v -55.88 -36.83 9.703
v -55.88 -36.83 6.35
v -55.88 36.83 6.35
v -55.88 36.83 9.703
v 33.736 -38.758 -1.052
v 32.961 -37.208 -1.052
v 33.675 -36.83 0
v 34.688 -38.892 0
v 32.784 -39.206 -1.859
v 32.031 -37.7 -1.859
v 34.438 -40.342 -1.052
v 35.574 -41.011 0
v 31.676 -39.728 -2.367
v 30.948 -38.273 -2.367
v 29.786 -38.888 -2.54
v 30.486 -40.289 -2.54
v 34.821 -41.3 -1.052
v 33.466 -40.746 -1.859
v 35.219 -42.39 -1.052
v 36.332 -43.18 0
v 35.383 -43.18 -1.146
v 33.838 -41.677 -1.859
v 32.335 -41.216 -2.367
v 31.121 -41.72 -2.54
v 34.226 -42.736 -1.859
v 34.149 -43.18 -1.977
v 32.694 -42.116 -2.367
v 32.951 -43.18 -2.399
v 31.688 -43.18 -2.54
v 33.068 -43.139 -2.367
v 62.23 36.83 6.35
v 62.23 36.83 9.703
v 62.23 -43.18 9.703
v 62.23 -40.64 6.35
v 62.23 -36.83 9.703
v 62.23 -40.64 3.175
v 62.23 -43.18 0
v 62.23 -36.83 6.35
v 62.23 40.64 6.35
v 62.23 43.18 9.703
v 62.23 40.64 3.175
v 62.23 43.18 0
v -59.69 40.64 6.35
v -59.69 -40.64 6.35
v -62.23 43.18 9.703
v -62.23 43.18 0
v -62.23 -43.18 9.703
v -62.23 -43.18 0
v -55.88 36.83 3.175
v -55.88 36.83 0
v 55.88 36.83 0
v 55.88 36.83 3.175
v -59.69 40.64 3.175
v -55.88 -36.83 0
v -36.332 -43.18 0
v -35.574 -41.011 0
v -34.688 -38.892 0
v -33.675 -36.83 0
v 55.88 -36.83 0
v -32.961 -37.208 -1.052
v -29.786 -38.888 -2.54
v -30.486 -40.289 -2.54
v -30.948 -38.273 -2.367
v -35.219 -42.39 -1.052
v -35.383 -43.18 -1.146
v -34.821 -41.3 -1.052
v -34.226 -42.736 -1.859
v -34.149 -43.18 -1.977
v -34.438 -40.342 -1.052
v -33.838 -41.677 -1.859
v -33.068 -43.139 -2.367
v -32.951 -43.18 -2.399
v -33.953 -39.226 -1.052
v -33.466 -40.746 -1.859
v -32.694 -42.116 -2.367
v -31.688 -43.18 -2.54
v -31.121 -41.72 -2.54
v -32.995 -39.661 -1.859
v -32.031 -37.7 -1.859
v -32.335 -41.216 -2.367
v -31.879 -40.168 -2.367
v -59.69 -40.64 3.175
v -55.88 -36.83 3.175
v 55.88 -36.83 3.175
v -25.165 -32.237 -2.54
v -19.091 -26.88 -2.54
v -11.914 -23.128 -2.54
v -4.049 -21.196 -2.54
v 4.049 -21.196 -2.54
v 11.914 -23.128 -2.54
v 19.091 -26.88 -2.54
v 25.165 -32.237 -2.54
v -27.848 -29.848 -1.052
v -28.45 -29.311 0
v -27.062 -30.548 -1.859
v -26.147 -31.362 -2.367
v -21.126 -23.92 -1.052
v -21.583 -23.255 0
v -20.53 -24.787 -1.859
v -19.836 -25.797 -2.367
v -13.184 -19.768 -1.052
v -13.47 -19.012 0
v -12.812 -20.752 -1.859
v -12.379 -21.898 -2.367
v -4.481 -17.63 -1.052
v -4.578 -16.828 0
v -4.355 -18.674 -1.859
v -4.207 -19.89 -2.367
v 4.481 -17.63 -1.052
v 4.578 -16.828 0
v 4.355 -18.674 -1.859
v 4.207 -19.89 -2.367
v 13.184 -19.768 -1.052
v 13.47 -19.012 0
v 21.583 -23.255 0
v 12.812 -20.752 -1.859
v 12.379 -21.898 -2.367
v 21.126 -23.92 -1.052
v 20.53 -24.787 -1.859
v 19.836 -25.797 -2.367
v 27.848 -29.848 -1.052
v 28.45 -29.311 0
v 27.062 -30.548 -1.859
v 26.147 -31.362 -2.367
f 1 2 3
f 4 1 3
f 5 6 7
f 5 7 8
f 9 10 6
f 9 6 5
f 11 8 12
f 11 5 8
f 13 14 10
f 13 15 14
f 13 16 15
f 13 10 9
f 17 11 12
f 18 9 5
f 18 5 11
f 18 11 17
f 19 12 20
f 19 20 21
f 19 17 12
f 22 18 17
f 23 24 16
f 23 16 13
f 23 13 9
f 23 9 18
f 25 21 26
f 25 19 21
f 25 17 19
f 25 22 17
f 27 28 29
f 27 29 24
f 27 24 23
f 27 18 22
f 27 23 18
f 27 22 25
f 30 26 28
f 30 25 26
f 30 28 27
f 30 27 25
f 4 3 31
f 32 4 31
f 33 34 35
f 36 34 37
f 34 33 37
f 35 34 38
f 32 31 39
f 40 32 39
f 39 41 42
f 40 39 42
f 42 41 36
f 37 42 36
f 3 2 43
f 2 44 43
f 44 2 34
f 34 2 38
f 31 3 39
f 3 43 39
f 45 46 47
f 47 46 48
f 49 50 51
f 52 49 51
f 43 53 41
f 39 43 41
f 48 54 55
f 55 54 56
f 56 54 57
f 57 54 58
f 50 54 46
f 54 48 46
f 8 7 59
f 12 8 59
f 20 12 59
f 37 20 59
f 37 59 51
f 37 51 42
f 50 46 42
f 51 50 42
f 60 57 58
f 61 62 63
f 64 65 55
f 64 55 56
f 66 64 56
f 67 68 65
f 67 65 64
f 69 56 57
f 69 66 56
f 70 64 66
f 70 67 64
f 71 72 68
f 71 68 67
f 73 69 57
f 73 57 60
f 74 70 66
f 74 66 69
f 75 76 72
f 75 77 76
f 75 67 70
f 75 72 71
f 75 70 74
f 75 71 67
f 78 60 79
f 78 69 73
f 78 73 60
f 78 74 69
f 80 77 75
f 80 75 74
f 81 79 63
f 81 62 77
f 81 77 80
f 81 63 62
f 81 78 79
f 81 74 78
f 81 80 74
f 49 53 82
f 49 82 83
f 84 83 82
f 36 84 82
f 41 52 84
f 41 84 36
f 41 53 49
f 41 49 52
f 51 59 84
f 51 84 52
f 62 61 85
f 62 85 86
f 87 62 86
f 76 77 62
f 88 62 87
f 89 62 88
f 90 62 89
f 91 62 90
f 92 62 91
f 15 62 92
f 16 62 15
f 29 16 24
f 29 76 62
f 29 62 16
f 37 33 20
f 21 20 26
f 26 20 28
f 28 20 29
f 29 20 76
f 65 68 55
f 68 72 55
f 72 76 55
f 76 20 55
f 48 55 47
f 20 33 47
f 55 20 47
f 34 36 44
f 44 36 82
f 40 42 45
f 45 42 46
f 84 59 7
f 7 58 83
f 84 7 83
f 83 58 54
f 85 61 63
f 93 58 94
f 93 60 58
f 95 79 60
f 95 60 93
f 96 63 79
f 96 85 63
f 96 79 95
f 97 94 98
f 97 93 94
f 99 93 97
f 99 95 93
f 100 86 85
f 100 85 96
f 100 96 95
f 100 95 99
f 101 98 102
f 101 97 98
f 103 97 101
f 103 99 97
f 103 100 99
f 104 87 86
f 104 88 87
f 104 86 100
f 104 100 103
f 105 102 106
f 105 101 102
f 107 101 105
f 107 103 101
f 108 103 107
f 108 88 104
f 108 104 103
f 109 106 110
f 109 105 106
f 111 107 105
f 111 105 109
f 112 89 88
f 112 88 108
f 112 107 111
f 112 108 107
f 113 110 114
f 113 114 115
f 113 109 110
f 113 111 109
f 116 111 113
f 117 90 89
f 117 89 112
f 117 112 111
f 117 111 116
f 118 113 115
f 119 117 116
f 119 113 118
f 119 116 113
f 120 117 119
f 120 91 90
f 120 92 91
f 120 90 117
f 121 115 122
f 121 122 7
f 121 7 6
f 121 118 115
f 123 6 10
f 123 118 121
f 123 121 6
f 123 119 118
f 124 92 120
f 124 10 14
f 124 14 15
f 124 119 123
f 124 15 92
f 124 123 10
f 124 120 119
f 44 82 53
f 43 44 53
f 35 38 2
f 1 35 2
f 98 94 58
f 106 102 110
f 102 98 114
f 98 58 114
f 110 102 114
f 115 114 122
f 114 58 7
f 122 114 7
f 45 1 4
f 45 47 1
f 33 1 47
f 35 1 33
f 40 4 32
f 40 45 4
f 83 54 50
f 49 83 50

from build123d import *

# Parameters (mm, degrees)
F0_W        = 2.54
F0_H        = 3.81
F0_W_2      = 3.81
F0_H_2      = 73.66
F1_DEPTH    = 3.175
F2_DEPTH    = 9.7028
F3_START    = 6.35
F3_DEPTH    = 3.3528
F5_DEPTH    = 2.54
F6_T2_ANGLE = 26.9228721227
F6_T4_ANGLE = 124.2205290786
F6_T6_ANGLE = 26.9228721227


# Not quite as in the source:
# - a fillet or chamfer that OpenCascade refuses, or shapes differently, is made with other operations: its cross-section is extruded or revolved along the edge and cut away or added


with BuildPart() as f1:
    # F0 (on Top) → F1 (new body)
    with BuildSketch(Plane.XY):
        Polygon((-55.88, -36.83), (-55.88, 36.83), (55.88, 36.83), (59.69, 36.83), (59.69, 40.64), (-59.69, 40.64), (-59.69, -40.64), (59.69, -40.64), (59.69, -36.83), (55.88, -36.83), align=None)
        with Locations((60.96, 38.735)):
            Rectangle(F0_W, F0_H)
        with Locations((60.96, -38.735)):
            Rectangle(F0_W, F0_H)
        with Locations((57.785, 0)):
            Rectangle(F0_W_2, F0_H_2)
        with Locations((60.96, 0)):
            Rectangle(F0_W, F0_H_2)
    extrude(amount=F1_DEPTH)

    # F0 (on Top) → F2 (join)
    with BuildSketch(Plane.XY):
        Polygon((-59.69, 40.64), (59.69, 40.64), (62.23, 40.64), (62.23, 43.18), (-62.23, 43.18), (-62.23, -43.18), (62.23, -43.18), (62.23, -40.64), (59.69, -40.64), (-59.69, -40.64), align=None)
    extrude(amount=F2_DEPTH)

    # F0 (on Top) → F3 (join)
    with BuildSketch(Plane.XY.offset(F3_START)):
        Polygon((-55.88, -36.83), (-55.88, 36.83), (55.88, 36.83), (59.69, 36.83), (59.69, 40.64), (-59.69, 40.64), (-59.69, -40.64), (59.69, -40.64), (59.69, -36.83), (55.88, -36.83), align=None)
        with Locations((60.96, -38.735)):
            Rectangle(F0_W, F0_H)
        with Locations((60.96, 38.735)):
            Rectangle(F0_W, F0_H)
    extrude(amount=F3_DEPTH)

    # F4 (on face) → F5 (join)
    with BuildSketch(Plane(origin=(0, 0, 0), x_dir=(1, 0, 0), z_dir=(0, 0, -1))):
        with BuildLine():
            Line((33.6746639179, 36.83), (-33.6746639179, 36.83))
            ThreePointArc((-33.6746639179, 36.83), (0, 16.5520933119), (33.6746639179, 36.83))
        make_face()
        with BuildLine():
            Line((36.331819044, 43.18), (-36.331819044, 43.18))
            ThreePointArc((-36.331819044, 43.18), (-35.1469421027, 39.9448685285), (-33.6746639179, 36.83))
            Line((-33.6746639179, 36.83), (33.6746639179, 36.83))
            ThreePointArc((33.6746639179, 36.83), (35.1469421027, 39.9448685285), (36.331819044, 43.18))
        make_face()
    extrude(amount=F5_DEPTH)

    # F6: fillet of radius 5.08 on 1 edges, made by hand

    # F6_s1 → F6_t2 (revolve, cut)
    with BuildSketch(Plane(origin=(-0.9220761964, -54.6365318462, 0), x_dir=(0, 0, 1), z_dir=(-0.0168741478, -0.9998576214, 0))):
        with BuildLine():
            ThreePointArc((0, 37.177792501), (-1.8594090512, 35.3183834498), (-2.54, 32.7783834498))
            Line((-2.54, 32.7783834498), (-2.54, 37.177792501))
            Line((-2.54, 37.177792501), (0, 37.177792501))
        make_face()
    revolve(axis=Axis((0, -54.6520933119, -2.54), (0, 0, -1)), revolution_arc=F6_T2_ANGLE, mode=Mode.SUBTRACT)

    # F6_s3 → F6_t4 (revolve, cut)
    with BuildSketch(Plane(origin=(-22.5953375952, -42.6936601597, 0), x_dir=(0, 0, 1), z_dir=(-0.4677714801, -0.8838494455, 0))):
        with BuildLine():
            ThreePointArc((0, 12.5353094191), (-1.8594090512, 10.6759003679), (-2.54, 8.1359003679))
            Line((-2.54, 8.1359003679), (-2.54, 12.5353094191))
            Line((-2.54, 12.5353094191), (0, 12.5353094191))
        make_face()
    revolve(axis=Axis((0, -54.6520933119, -2.54), (0, 0, -1)), revolution_arc=F6_T4_ANGLE, mode=Mode.SUBTRACT)

    # F6_s5 → F6_t6 (revolve, cut)
    with BuildSketch(Plane(origin=(22.5953375952, -42.6936601597, 0), x_dir=(0, 0, 1), z_dir=(-0.4677714801, 0.8838494455, 0))):
        with BuildLine():
            ThreePointArc((0, 12.5353094191), (-1.8594090512, 10.6759003679), (-2.54, 8.1359003679))
            Line((-2.54, 8.1359003679), (-2.54, 12.5353094191))
            Line((-2.54, 12.5353094191), (0, 12.5353094191))
        make_face()
    revolve(axis=Axis((0, -54.6520933119, -2.54), (0, 0, -1)), revolution_arc=F6_T6_ANGLE, mode=Mode.SUBTRACT)


solid = f1.part
